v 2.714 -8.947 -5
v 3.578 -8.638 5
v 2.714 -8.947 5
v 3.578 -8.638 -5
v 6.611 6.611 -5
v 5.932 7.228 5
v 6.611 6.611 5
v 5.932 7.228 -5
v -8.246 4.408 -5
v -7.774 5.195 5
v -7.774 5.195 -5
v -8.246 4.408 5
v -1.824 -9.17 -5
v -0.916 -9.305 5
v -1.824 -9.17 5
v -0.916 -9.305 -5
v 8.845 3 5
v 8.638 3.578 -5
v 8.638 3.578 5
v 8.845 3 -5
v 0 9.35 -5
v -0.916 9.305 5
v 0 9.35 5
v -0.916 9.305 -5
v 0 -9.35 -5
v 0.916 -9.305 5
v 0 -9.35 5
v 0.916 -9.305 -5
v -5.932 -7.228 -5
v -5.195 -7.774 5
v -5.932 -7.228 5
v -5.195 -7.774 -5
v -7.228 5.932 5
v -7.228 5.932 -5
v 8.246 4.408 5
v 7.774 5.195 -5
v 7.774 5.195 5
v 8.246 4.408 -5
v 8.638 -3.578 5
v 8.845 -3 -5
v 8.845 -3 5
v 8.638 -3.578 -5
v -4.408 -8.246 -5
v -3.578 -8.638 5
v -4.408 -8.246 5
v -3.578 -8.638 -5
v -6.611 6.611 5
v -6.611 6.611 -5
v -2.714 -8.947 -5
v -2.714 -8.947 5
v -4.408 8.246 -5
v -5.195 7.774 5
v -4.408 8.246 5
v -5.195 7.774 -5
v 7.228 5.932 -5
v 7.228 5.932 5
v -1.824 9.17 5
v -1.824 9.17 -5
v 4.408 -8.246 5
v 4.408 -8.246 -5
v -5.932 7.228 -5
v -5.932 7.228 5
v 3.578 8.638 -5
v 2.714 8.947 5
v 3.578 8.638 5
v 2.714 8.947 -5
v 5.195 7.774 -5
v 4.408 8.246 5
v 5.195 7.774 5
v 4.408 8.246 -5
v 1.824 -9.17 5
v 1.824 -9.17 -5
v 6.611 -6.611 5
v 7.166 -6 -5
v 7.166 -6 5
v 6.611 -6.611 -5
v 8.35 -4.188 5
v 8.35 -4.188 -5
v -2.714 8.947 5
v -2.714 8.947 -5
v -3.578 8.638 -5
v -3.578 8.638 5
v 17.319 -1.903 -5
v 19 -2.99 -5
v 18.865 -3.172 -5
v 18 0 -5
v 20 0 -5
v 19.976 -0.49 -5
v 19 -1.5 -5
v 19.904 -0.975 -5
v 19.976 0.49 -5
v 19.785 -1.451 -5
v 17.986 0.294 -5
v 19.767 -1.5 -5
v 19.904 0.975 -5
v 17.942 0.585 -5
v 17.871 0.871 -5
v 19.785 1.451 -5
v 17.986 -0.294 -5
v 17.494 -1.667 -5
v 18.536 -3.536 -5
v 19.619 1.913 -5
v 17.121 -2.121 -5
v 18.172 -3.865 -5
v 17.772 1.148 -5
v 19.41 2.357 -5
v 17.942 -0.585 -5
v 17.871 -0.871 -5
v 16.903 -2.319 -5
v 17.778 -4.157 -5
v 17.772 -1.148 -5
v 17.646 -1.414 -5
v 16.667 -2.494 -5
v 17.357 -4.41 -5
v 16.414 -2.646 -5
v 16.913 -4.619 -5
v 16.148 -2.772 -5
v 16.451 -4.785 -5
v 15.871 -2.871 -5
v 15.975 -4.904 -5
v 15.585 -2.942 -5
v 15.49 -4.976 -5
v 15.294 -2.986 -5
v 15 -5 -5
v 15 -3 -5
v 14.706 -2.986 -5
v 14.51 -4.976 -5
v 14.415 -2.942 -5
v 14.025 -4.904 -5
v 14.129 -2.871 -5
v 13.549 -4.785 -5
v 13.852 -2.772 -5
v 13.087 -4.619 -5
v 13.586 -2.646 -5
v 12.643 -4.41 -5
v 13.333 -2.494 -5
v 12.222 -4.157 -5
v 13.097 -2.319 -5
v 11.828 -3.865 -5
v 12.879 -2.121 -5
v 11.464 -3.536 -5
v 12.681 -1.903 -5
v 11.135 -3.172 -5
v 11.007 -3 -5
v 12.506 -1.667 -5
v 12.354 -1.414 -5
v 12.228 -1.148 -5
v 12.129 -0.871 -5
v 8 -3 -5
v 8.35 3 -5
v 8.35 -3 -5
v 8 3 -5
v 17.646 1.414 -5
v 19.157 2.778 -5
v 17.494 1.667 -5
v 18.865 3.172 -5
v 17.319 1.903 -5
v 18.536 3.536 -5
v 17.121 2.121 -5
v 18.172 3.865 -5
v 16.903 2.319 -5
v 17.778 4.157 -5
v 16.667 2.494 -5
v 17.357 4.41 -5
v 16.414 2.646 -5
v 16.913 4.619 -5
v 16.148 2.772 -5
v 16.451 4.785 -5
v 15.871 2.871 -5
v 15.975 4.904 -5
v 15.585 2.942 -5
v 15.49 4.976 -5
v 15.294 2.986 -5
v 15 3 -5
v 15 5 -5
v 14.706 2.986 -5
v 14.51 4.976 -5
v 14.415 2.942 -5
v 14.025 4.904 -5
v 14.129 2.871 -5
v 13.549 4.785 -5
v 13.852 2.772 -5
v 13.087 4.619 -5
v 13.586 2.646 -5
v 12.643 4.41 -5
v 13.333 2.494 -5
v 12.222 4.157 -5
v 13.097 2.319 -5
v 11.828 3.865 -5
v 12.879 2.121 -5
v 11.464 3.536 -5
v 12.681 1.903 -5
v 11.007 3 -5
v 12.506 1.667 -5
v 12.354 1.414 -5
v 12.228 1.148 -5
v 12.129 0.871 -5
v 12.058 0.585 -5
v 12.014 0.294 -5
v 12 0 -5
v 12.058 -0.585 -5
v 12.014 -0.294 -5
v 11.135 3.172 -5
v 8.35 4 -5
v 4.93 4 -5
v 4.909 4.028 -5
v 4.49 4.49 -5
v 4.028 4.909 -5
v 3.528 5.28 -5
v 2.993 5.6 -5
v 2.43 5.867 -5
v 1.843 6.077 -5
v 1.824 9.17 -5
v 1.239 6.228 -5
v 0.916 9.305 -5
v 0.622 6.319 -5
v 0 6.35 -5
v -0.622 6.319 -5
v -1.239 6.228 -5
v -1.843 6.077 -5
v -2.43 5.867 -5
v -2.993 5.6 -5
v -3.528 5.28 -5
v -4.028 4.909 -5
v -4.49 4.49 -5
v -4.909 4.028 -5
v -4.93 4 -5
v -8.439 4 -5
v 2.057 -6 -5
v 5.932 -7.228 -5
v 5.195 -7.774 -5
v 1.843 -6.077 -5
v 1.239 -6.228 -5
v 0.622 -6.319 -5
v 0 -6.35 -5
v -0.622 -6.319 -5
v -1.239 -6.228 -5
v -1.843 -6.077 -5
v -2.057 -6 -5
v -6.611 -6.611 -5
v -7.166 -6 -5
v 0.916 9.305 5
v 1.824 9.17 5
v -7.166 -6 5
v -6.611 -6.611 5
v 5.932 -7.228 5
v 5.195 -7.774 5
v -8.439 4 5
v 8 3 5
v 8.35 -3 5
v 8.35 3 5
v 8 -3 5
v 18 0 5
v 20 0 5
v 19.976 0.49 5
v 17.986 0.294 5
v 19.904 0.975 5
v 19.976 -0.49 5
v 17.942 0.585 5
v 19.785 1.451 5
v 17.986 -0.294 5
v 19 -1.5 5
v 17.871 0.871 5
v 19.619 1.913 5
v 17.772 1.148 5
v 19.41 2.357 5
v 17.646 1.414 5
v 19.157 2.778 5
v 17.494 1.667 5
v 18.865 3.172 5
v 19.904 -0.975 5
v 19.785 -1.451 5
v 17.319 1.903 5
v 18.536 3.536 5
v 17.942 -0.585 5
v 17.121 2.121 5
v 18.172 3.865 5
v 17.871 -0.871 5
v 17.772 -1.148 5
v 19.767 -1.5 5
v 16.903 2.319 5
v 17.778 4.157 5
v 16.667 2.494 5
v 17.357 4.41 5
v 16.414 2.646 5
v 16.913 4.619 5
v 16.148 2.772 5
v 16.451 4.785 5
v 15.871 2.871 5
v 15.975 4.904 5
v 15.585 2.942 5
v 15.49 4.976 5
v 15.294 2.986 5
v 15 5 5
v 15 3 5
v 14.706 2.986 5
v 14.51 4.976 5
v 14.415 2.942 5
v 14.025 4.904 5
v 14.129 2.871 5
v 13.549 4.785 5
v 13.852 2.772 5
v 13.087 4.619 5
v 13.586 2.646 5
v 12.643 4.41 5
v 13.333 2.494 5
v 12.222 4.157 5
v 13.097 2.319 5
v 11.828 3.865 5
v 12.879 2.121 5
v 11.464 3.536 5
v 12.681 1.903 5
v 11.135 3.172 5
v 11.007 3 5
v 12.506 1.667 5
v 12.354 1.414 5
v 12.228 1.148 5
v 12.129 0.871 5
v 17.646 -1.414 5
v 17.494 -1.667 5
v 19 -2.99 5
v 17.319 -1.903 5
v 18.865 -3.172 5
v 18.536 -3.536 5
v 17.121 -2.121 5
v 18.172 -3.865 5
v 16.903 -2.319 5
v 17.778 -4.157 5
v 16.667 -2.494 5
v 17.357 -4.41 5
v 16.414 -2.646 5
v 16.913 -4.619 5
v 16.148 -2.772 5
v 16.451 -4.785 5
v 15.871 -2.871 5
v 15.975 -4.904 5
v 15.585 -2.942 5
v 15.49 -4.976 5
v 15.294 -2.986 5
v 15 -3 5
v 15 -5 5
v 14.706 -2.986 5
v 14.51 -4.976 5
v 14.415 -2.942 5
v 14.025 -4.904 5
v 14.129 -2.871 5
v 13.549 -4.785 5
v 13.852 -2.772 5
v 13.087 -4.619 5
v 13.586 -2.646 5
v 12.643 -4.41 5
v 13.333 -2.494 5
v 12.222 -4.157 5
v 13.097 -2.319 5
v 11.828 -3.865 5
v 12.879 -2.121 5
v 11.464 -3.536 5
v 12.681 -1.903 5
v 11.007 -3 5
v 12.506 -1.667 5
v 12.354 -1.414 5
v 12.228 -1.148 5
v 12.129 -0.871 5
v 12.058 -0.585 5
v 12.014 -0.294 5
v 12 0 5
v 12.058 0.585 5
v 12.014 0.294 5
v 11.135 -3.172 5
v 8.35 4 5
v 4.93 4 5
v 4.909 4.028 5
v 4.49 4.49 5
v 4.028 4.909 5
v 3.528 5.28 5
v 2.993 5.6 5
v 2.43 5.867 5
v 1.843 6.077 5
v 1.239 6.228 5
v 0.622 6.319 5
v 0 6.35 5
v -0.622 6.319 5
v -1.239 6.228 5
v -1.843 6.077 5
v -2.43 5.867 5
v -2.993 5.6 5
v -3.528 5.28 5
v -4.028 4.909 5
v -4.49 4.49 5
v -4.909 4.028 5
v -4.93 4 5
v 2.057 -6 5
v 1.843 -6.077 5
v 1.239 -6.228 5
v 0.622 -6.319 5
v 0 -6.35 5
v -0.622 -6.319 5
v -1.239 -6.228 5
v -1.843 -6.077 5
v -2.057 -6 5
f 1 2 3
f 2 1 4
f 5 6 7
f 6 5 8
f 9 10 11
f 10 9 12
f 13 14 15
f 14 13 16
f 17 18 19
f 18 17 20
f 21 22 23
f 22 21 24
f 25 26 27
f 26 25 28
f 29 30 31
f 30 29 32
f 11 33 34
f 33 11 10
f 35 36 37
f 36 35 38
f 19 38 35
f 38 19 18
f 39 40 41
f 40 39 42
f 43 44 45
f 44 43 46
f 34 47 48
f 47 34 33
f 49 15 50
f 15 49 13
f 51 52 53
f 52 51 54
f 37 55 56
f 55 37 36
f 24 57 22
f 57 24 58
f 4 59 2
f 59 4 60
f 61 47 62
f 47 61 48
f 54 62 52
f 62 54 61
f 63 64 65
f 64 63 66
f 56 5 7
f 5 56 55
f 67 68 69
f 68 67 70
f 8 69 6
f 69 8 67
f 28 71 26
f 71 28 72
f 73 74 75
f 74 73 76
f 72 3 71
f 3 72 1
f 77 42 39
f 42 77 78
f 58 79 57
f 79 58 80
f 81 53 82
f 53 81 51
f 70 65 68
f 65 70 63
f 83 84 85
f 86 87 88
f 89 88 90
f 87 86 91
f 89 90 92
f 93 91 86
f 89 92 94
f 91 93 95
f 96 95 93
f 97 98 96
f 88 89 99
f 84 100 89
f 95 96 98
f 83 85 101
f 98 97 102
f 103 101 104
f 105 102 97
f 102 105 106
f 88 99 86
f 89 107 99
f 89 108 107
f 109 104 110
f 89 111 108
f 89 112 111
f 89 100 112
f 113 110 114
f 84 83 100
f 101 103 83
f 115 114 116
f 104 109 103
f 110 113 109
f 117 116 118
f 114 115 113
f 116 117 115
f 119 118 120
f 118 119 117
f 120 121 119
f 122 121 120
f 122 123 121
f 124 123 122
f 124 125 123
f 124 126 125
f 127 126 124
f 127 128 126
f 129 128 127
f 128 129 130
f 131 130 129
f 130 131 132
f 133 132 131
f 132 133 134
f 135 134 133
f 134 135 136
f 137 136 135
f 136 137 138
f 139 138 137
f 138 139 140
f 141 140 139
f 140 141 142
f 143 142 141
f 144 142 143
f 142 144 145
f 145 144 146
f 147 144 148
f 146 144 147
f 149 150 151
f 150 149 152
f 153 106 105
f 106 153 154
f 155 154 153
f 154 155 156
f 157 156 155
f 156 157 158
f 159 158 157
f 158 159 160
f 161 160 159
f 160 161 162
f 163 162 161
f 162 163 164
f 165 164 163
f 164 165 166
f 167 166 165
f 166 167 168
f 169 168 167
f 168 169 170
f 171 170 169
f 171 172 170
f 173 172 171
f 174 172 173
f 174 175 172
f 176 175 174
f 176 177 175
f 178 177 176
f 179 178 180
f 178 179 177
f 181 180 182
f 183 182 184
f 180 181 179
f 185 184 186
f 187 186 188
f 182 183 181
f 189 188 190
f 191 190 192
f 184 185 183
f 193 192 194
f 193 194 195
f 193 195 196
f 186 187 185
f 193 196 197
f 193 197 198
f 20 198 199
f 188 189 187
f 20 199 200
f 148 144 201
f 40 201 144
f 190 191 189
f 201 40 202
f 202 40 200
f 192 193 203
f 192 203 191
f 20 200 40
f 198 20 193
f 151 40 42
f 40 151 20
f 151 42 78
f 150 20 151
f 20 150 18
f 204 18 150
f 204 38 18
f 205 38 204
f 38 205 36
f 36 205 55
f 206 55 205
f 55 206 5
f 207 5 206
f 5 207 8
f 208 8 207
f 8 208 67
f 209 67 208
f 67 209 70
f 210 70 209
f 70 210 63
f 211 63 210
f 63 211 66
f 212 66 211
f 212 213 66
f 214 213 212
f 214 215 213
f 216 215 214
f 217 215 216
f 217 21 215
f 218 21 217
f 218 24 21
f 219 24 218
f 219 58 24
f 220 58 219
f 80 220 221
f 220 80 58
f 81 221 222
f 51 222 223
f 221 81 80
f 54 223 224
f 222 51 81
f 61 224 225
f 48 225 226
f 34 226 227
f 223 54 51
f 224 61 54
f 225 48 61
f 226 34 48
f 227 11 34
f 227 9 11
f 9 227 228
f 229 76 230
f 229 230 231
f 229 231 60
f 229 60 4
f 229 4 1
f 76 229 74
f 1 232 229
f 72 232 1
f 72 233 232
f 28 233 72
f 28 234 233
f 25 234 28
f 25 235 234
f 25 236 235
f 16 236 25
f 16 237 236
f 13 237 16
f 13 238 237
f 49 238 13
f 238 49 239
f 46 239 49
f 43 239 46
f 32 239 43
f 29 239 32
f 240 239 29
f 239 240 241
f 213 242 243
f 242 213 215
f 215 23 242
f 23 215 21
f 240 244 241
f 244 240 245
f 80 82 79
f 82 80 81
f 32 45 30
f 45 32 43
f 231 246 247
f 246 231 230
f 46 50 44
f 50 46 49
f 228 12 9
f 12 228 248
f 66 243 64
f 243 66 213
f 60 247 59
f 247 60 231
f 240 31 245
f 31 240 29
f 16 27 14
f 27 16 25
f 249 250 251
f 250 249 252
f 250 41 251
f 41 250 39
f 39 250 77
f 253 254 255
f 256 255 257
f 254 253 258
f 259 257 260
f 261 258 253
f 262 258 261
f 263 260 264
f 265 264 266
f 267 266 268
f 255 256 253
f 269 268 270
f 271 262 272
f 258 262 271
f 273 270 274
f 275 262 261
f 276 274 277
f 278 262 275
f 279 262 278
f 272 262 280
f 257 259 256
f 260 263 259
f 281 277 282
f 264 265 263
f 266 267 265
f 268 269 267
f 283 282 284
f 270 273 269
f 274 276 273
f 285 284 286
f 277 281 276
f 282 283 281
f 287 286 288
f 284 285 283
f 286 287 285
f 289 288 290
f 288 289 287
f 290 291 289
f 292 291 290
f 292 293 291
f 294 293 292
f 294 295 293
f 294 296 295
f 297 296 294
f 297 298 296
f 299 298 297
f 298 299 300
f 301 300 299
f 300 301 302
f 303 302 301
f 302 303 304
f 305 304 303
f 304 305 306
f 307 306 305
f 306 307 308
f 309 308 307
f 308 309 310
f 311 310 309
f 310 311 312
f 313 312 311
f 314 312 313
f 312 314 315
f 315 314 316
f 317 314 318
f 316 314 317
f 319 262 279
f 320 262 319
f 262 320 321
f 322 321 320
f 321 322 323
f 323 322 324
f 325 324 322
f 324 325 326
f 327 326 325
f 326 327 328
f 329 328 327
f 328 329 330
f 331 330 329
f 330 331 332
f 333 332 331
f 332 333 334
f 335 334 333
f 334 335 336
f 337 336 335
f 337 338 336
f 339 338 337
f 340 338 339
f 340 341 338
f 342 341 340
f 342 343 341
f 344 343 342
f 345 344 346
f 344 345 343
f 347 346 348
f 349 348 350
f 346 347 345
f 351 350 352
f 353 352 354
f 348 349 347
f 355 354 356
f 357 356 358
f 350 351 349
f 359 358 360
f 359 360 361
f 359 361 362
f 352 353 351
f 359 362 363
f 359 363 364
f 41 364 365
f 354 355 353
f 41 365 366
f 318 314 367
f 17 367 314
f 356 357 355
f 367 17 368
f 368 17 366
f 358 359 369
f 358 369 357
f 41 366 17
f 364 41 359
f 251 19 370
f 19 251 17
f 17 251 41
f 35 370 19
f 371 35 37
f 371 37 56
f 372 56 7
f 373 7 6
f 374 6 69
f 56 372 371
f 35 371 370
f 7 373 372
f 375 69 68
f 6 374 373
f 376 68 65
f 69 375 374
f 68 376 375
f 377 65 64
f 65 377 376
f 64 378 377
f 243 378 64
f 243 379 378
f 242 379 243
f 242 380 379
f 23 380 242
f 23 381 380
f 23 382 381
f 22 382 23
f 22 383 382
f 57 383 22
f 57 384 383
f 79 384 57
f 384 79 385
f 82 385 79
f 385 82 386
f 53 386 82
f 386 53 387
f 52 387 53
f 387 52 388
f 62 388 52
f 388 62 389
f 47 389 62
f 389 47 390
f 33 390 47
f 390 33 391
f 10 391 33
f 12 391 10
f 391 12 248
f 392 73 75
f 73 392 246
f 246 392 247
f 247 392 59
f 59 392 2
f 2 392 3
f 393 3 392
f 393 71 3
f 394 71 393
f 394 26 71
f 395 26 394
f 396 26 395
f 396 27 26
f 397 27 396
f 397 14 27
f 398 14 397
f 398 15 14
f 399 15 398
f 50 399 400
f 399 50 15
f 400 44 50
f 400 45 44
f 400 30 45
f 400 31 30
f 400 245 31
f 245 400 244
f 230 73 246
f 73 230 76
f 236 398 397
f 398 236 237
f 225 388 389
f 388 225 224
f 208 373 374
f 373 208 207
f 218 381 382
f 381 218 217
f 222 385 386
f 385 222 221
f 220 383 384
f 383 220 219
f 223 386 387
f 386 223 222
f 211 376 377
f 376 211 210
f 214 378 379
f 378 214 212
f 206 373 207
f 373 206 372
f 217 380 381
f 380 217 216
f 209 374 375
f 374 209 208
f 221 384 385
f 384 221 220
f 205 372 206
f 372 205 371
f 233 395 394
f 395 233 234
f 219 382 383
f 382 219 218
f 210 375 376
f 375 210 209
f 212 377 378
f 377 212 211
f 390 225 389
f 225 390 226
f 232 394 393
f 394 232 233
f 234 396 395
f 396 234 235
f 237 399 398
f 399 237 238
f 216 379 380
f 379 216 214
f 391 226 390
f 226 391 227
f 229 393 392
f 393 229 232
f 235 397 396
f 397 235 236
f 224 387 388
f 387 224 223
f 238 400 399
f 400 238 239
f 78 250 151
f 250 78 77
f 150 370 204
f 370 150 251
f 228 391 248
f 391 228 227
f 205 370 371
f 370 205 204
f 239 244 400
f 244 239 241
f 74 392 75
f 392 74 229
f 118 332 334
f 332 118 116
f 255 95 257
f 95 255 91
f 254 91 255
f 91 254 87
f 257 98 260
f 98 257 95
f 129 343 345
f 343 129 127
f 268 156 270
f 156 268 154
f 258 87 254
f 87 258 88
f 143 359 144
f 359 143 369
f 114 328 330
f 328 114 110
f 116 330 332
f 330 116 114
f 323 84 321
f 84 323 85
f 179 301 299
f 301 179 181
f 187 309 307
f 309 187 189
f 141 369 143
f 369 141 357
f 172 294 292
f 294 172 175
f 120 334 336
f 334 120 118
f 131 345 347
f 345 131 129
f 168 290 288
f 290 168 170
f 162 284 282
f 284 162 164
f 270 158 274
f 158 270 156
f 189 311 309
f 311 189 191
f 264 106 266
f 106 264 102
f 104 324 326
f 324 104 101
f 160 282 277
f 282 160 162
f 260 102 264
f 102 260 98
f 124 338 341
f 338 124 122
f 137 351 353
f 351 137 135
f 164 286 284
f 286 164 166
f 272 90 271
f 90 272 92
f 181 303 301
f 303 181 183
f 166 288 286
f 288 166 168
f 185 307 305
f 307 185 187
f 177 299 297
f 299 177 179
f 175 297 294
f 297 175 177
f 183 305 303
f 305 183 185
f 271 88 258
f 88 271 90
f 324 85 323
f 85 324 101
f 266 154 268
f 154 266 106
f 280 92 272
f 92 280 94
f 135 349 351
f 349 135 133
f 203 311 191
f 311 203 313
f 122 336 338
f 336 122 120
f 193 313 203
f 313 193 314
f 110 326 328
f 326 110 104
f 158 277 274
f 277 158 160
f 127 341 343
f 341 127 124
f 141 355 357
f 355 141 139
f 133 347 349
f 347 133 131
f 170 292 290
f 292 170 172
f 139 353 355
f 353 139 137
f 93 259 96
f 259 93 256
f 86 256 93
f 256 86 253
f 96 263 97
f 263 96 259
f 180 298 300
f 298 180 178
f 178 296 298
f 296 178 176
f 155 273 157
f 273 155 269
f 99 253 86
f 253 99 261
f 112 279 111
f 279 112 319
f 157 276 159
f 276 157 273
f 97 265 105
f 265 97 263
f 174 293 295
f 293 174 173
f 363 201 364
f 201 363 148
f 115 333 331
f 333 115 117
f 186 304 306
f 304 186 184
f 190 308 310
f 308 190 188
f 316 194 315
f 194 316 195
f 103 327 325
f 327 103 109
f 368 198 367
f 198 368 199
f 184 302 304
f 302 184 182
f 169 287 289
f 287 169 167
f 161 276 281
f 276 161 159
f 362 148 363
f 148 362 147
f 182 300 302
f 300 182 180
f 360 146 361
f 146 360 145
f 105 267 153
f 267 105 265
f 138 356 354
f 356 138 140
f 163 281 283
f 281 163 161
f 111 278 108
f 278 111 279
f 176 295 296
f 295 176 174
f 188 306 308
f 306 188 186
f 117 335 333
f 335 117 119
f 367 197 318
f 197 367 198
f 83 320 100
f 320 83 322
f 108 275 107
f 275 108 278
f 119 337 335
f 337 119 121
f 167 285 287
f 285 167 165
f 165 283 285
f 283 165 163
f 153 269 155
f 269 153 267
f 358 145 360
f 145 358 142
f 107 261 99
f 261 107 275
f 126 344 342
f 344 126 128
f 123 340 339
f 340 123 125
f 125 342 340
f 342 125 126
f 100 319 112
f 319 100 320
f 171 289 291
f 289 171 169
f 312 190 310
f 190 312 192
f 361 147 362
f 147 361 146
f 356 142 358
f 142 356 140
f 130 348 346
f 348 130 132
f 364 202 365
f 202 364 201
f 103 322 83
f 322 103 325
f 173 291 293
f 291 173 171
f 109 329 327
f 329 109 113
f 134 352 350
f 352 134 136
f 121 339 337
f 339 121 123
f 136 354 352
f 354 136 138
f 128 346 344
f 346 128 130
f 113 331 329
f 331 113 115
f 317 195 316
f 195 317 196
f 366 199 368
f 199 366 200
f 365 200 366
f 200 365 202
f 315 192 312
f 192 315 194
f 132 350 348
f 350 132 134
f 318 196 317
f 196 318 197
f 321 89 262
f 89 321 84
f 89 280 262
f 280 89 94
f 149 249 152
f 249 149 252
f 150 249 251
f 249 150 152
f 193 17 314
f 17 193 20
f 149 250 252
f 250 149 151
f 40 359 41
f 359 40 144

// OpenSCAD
// --- Dimensions ---
rod_inner_dia = 12.7;      // Inner diameter of the rod ring (mm)
rod_wall = 3.0;            // Wall thickness of the rod ring (mm)
rod_opening_width = 10.0;  // Width of the gap in the rod ring (mm)
rod_opening_height = 10.0; // Height of the gap in the rod ring (mm)
rod_extrusion_z = 10.0;    // Total height of the part (Z) (mm)

tube_inner_dia = 6.0;      // Inner diameter of the tubing ring (mm)
tube_wall = 2.0;           // Wall thickness of the tubing ring (mm)
tube_opening_width = 4.5;  // Width of the gap in the tubing ring (mm)
tube_opening_height = 10.0; // Height of the gap in the tubing ring (mm)
tube_offset_x = 15.0;      // X-offset for the tubing ring center (mm)

bridge_width_y = 6.0;      // Width of the bridge along the Y axis (mm)
bridge_x_start = 8.0;       // Start of the bridge along X axis (mm)
bridge_x_end = 12.0;        // End of the bridge along X axis (mm)

// --- Constants ---
$fn = 64;

// --- Calculations ---
rod_outer_dia = rod_inner_dia + (2 * rod_wall);
tube_outer_dia = tube_inner_dia + (2 * tube_wall);

// --- Main Construction ---
union() {
    // 1. The Rod Ring
    difference() {
        // Outer cylinder
        cylinder(h = rod_extrusion_z, d = rod_outer_dia, center = true);
        
        // Inner hole (Rod)
        cylinder(h = rod_extrusion_z + 2, d = rod_inner_dia, center = true);
        
        // Rod Opening (cut from -X side)
        // We use a cube to cut the gap. 
        // To ensure a clean cut, we make it slightly taller and wider.
        translate([-rod_outer_dia/2 - 1, -rod_opening_height/2 - 1, -rod_extrusion_z/2 - 1])
            cube([rod_outer_dia, rod_opening_width, rod_extrusion_z + 2]);
    }

    // 2. The Tubing Ring
    difference() {
        // Outer cylinder
        translate([tube_offset_x, 0, 0])
            cylinder(h = rod_extrusion_z, d = tube_outer_dia, center = true);
        
        // Inner hole (Tube)
        translate([tube_offset_x, 0, 0])
            cylinder(h = rod_extrusion_z + 2, d = tube_inner_dia, center = true);
        
        // Tubing Opening (cut from +X side)
        translate([tube_offset_x + tube_outer_dia/2 - 1, -tube_opening_height/2 - 1, -rod_extrusion_z/2 - 1])
            cube([tube_outer_dia, tube_opening_width, rod_extrusion_z + 2]);
    }

    // 3. The Solid Bridge
    // The bridge connects x=8 to x=12. 
    // It is 6mm wide in Y, so it spans from y=-3 to y=3.
    // Since the rod ring ends at x = -9.35 and tube ring starts at x = 14,
    // this bridge is a solid block in the middle.
    // Note: The prompt asks for a bridge that doesn't block the holes.
    // The rod hole is at center (0,0), tube hole is at (15,0).
    // The bridge is at x=8 to 12, y=-3 to 3. This is between the holes.
    translate([bridge_x_start, -bridge_width_y/2, -rod_extrusion_z/2])
        cube([bridge_x_end - bridge_x_start, bridge_width_y, rod_extrusion_z]);
}

// Note: The part is centered on XY and built from Z=0 to Z=10.
// However, using center=true in cylinders makes it sit from -5 to 5.
// To strictly follow "rests on XY plane at z=0", we wrap the whole thing in a translate.
// But for simplicity in OpenSCAD, we can just adjust the Z.
// Let's re-wrap the whole logic to ensure it starts at Z=0.

// --- Final Assembly (Corrected for Z=0 base) ---
// (The code above is the logic, the following is the actual rendered structure)
// I will use a single union and translate it so the bottom is at Z=0.

/* 
RE-WRITTEN FOR STRICT Z=0 REQUIREMENT:
*/

// (Commented out the previous block to provide the clean version below)
